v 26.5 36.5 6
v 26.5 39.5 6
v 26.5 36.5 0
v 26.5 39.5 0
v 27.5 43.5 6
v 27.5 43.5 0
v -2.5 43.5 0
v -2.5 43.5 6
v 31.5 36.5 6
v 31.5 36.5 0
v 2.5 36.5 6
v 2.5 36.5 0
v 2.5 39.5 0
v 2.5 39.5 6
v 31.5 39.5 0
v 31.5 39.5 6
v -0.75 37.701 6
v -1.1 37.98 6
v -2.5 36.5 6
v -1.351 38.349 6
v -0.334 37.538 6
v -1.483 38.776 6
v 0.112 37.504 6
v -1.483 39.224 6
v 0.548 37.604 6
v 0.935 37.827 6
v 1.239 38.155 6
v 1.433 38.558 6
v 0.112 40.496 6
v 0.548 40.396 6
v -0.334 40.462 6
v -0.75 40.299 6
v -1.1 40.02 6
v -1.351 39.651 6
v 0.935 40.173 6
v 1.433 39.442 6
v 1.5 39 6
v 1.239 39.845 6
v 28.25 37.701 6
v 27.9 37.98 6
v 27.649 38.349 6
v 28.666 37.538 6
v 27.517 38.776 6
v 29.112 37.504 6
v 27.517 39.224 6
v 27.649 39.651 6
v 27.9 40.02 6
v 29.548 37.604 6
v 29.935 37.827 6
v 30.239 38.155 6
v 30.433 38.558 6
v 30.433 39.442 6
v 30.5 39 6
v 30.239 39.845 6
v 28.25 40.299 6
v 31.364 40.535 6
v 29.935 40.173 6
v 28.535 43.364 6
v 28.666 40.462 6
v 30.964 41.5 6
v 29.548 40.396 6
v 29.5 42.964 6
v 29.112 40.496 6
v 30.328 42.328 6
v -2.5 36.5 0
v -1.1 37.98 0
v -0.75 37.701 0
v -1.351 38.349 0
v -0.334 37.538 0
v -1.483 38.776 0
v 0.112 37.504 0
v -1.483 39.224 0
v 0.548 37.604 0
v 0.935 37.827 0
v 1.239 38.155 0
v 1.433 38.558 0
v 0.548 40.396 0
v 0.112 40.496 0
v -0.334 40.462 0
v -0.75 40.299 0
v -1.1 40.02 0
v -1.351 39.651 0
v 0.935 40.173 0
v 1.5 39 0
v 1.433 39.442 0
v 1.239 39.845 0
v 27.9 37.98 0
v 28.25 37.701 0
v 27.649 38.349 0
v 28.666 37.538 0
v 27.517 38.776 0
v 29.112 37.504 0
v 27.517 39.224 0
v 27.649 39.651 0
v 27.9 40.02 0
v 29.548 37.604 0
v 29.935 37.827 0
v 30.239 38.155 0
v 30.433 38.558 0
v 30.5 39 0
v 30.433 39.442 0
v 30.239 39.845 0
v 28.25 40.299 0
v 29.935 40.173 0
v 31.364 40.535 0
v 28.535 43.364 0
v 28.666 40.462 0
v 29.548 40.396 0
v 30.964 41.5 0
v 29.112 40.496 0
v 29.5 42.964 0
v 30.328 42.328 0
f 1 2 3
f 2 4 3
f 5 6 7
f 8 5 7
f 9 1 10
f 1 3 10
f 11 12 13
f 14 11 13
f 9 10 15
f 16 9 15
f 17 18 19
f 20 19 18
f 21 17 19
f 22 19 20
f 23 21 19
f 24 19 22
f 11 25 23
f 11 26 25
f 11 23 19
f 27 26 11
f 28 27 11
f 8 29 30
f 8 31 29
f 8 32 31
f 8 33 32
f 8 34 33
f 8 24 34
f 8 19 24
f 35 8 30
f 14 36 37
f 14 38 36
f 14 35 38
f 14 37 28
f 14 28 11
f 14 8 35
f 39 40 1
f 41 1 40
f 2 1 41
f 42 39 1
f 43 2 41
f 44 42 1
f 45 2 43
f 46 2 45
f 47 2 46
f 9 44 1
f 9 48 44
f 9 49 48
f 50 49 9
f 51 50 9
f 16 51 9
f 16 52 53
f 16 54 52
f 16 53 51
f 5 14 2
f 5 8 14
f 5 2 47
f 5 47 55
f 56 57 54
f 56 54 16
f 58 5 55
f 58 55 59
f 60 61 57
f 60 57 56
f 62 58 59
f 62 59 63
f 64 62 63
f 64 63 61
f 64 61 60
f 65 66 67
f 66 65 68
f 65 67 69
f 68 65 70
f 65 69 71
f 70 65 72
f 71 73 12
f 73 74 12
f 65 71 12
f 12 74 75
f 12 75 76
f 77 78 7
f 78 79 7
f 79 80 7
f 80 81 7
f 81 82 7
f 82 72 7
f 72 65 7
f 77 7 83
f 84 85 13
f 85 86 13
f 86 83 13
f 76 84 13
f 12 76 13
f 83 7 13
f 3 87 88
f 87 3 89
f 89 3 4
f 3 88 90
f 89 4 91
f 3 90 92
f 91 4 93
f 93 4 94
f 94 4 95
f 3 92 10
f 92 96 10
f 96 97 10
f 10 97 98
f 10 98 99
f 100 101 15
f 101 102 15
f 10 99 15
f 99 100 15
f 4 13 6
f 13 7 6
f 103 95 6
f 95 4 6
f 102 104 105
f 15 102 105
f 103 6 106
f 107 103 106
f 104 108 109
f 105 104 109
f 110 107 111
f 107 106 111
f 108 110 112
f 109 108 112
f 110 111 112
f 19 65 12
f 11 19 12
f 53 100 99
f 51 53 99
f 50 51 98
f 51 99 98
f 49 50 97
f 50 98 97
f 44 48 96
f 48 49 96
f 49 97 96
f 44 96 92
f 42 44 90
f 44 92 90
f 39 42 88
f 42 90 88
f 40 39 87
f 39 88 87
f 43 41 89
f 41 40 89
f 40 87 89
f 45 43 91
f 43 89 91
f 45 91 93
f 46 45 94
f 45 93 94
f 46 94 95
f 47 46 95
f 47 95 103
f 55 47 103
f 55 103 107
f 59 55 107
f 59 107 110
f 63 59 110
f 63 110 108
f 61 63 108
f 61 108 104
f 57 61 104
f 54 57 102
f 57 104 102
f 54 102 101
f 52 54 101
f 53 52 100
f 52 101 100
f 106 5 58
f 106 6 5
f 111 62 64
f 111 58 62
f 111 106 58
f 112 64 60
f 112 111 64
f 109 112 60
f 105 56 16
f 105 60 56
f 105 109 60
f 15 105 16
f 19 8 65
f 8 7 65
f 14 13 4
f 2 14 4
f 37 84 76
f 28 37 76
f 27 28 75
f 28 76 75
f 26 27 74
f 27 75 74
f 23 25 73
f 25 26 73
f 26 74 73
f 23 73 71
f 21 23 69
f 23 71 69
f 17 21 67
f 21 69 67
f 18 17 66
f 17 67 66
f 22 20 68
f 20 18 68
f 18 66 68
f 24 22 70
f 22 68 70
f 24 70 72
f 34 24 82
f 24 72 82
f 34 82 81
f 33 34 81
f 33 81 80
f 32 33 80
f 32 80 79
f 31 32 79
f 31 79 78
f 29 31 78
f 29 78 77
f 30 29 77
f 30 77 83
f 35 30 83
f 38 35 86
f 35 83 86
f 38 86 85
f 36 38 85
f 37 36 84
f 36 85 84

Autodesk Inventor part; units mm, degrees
ref_plane "YZ Plane" through (0, 0, 0) normal (1, 0, 0) x (0, 1, 0)
ref_plane "XZ Plane" through (0, 0, 0) normal (0, 1, 0) x (-1, 0, 0)
ref_plane "XY Plane" through (0, 0, 0) normal (0, 0, 1) x (1, 0, 0)
sketch "Sketch1" plane through (0, 0, 0) normal (0, 0, 1) x (1, 0, 0)
  circle A0 centre (0, 39) radius 1.5
  circle A1 centre (29, 39) radius 1.5
  line L0 (-2.5, 36.5) -> (2.5, 36.5)
  line L1 (2.5, 36.5) -> (2.5, 39.5)
  line L2 (2.5, 39.5) -> (26.5, 39.5)
  line L3 (26.5, 39.5) -> (26.5, 36.5)
  line L4 (26.5, 36.5) -> (31.5, 36.5)
  line L5 (31.5, 36.5) -> (31.5, 39.5)
  arc A2 (31.5, 39.5) -> (27.5, 43.5) centre (27.5, 39.5) ccw
  line L6 (27.5, 43.5) -> (-2.5, 43.5)
  line L7 (-2.5, 43.5) -> (-2.5, 36.5)
  point P0 (0, 0)
extrude "Extrusion1" add sketch "Sketch1" along normal blind 6
properties part number "yCarMid_b"
